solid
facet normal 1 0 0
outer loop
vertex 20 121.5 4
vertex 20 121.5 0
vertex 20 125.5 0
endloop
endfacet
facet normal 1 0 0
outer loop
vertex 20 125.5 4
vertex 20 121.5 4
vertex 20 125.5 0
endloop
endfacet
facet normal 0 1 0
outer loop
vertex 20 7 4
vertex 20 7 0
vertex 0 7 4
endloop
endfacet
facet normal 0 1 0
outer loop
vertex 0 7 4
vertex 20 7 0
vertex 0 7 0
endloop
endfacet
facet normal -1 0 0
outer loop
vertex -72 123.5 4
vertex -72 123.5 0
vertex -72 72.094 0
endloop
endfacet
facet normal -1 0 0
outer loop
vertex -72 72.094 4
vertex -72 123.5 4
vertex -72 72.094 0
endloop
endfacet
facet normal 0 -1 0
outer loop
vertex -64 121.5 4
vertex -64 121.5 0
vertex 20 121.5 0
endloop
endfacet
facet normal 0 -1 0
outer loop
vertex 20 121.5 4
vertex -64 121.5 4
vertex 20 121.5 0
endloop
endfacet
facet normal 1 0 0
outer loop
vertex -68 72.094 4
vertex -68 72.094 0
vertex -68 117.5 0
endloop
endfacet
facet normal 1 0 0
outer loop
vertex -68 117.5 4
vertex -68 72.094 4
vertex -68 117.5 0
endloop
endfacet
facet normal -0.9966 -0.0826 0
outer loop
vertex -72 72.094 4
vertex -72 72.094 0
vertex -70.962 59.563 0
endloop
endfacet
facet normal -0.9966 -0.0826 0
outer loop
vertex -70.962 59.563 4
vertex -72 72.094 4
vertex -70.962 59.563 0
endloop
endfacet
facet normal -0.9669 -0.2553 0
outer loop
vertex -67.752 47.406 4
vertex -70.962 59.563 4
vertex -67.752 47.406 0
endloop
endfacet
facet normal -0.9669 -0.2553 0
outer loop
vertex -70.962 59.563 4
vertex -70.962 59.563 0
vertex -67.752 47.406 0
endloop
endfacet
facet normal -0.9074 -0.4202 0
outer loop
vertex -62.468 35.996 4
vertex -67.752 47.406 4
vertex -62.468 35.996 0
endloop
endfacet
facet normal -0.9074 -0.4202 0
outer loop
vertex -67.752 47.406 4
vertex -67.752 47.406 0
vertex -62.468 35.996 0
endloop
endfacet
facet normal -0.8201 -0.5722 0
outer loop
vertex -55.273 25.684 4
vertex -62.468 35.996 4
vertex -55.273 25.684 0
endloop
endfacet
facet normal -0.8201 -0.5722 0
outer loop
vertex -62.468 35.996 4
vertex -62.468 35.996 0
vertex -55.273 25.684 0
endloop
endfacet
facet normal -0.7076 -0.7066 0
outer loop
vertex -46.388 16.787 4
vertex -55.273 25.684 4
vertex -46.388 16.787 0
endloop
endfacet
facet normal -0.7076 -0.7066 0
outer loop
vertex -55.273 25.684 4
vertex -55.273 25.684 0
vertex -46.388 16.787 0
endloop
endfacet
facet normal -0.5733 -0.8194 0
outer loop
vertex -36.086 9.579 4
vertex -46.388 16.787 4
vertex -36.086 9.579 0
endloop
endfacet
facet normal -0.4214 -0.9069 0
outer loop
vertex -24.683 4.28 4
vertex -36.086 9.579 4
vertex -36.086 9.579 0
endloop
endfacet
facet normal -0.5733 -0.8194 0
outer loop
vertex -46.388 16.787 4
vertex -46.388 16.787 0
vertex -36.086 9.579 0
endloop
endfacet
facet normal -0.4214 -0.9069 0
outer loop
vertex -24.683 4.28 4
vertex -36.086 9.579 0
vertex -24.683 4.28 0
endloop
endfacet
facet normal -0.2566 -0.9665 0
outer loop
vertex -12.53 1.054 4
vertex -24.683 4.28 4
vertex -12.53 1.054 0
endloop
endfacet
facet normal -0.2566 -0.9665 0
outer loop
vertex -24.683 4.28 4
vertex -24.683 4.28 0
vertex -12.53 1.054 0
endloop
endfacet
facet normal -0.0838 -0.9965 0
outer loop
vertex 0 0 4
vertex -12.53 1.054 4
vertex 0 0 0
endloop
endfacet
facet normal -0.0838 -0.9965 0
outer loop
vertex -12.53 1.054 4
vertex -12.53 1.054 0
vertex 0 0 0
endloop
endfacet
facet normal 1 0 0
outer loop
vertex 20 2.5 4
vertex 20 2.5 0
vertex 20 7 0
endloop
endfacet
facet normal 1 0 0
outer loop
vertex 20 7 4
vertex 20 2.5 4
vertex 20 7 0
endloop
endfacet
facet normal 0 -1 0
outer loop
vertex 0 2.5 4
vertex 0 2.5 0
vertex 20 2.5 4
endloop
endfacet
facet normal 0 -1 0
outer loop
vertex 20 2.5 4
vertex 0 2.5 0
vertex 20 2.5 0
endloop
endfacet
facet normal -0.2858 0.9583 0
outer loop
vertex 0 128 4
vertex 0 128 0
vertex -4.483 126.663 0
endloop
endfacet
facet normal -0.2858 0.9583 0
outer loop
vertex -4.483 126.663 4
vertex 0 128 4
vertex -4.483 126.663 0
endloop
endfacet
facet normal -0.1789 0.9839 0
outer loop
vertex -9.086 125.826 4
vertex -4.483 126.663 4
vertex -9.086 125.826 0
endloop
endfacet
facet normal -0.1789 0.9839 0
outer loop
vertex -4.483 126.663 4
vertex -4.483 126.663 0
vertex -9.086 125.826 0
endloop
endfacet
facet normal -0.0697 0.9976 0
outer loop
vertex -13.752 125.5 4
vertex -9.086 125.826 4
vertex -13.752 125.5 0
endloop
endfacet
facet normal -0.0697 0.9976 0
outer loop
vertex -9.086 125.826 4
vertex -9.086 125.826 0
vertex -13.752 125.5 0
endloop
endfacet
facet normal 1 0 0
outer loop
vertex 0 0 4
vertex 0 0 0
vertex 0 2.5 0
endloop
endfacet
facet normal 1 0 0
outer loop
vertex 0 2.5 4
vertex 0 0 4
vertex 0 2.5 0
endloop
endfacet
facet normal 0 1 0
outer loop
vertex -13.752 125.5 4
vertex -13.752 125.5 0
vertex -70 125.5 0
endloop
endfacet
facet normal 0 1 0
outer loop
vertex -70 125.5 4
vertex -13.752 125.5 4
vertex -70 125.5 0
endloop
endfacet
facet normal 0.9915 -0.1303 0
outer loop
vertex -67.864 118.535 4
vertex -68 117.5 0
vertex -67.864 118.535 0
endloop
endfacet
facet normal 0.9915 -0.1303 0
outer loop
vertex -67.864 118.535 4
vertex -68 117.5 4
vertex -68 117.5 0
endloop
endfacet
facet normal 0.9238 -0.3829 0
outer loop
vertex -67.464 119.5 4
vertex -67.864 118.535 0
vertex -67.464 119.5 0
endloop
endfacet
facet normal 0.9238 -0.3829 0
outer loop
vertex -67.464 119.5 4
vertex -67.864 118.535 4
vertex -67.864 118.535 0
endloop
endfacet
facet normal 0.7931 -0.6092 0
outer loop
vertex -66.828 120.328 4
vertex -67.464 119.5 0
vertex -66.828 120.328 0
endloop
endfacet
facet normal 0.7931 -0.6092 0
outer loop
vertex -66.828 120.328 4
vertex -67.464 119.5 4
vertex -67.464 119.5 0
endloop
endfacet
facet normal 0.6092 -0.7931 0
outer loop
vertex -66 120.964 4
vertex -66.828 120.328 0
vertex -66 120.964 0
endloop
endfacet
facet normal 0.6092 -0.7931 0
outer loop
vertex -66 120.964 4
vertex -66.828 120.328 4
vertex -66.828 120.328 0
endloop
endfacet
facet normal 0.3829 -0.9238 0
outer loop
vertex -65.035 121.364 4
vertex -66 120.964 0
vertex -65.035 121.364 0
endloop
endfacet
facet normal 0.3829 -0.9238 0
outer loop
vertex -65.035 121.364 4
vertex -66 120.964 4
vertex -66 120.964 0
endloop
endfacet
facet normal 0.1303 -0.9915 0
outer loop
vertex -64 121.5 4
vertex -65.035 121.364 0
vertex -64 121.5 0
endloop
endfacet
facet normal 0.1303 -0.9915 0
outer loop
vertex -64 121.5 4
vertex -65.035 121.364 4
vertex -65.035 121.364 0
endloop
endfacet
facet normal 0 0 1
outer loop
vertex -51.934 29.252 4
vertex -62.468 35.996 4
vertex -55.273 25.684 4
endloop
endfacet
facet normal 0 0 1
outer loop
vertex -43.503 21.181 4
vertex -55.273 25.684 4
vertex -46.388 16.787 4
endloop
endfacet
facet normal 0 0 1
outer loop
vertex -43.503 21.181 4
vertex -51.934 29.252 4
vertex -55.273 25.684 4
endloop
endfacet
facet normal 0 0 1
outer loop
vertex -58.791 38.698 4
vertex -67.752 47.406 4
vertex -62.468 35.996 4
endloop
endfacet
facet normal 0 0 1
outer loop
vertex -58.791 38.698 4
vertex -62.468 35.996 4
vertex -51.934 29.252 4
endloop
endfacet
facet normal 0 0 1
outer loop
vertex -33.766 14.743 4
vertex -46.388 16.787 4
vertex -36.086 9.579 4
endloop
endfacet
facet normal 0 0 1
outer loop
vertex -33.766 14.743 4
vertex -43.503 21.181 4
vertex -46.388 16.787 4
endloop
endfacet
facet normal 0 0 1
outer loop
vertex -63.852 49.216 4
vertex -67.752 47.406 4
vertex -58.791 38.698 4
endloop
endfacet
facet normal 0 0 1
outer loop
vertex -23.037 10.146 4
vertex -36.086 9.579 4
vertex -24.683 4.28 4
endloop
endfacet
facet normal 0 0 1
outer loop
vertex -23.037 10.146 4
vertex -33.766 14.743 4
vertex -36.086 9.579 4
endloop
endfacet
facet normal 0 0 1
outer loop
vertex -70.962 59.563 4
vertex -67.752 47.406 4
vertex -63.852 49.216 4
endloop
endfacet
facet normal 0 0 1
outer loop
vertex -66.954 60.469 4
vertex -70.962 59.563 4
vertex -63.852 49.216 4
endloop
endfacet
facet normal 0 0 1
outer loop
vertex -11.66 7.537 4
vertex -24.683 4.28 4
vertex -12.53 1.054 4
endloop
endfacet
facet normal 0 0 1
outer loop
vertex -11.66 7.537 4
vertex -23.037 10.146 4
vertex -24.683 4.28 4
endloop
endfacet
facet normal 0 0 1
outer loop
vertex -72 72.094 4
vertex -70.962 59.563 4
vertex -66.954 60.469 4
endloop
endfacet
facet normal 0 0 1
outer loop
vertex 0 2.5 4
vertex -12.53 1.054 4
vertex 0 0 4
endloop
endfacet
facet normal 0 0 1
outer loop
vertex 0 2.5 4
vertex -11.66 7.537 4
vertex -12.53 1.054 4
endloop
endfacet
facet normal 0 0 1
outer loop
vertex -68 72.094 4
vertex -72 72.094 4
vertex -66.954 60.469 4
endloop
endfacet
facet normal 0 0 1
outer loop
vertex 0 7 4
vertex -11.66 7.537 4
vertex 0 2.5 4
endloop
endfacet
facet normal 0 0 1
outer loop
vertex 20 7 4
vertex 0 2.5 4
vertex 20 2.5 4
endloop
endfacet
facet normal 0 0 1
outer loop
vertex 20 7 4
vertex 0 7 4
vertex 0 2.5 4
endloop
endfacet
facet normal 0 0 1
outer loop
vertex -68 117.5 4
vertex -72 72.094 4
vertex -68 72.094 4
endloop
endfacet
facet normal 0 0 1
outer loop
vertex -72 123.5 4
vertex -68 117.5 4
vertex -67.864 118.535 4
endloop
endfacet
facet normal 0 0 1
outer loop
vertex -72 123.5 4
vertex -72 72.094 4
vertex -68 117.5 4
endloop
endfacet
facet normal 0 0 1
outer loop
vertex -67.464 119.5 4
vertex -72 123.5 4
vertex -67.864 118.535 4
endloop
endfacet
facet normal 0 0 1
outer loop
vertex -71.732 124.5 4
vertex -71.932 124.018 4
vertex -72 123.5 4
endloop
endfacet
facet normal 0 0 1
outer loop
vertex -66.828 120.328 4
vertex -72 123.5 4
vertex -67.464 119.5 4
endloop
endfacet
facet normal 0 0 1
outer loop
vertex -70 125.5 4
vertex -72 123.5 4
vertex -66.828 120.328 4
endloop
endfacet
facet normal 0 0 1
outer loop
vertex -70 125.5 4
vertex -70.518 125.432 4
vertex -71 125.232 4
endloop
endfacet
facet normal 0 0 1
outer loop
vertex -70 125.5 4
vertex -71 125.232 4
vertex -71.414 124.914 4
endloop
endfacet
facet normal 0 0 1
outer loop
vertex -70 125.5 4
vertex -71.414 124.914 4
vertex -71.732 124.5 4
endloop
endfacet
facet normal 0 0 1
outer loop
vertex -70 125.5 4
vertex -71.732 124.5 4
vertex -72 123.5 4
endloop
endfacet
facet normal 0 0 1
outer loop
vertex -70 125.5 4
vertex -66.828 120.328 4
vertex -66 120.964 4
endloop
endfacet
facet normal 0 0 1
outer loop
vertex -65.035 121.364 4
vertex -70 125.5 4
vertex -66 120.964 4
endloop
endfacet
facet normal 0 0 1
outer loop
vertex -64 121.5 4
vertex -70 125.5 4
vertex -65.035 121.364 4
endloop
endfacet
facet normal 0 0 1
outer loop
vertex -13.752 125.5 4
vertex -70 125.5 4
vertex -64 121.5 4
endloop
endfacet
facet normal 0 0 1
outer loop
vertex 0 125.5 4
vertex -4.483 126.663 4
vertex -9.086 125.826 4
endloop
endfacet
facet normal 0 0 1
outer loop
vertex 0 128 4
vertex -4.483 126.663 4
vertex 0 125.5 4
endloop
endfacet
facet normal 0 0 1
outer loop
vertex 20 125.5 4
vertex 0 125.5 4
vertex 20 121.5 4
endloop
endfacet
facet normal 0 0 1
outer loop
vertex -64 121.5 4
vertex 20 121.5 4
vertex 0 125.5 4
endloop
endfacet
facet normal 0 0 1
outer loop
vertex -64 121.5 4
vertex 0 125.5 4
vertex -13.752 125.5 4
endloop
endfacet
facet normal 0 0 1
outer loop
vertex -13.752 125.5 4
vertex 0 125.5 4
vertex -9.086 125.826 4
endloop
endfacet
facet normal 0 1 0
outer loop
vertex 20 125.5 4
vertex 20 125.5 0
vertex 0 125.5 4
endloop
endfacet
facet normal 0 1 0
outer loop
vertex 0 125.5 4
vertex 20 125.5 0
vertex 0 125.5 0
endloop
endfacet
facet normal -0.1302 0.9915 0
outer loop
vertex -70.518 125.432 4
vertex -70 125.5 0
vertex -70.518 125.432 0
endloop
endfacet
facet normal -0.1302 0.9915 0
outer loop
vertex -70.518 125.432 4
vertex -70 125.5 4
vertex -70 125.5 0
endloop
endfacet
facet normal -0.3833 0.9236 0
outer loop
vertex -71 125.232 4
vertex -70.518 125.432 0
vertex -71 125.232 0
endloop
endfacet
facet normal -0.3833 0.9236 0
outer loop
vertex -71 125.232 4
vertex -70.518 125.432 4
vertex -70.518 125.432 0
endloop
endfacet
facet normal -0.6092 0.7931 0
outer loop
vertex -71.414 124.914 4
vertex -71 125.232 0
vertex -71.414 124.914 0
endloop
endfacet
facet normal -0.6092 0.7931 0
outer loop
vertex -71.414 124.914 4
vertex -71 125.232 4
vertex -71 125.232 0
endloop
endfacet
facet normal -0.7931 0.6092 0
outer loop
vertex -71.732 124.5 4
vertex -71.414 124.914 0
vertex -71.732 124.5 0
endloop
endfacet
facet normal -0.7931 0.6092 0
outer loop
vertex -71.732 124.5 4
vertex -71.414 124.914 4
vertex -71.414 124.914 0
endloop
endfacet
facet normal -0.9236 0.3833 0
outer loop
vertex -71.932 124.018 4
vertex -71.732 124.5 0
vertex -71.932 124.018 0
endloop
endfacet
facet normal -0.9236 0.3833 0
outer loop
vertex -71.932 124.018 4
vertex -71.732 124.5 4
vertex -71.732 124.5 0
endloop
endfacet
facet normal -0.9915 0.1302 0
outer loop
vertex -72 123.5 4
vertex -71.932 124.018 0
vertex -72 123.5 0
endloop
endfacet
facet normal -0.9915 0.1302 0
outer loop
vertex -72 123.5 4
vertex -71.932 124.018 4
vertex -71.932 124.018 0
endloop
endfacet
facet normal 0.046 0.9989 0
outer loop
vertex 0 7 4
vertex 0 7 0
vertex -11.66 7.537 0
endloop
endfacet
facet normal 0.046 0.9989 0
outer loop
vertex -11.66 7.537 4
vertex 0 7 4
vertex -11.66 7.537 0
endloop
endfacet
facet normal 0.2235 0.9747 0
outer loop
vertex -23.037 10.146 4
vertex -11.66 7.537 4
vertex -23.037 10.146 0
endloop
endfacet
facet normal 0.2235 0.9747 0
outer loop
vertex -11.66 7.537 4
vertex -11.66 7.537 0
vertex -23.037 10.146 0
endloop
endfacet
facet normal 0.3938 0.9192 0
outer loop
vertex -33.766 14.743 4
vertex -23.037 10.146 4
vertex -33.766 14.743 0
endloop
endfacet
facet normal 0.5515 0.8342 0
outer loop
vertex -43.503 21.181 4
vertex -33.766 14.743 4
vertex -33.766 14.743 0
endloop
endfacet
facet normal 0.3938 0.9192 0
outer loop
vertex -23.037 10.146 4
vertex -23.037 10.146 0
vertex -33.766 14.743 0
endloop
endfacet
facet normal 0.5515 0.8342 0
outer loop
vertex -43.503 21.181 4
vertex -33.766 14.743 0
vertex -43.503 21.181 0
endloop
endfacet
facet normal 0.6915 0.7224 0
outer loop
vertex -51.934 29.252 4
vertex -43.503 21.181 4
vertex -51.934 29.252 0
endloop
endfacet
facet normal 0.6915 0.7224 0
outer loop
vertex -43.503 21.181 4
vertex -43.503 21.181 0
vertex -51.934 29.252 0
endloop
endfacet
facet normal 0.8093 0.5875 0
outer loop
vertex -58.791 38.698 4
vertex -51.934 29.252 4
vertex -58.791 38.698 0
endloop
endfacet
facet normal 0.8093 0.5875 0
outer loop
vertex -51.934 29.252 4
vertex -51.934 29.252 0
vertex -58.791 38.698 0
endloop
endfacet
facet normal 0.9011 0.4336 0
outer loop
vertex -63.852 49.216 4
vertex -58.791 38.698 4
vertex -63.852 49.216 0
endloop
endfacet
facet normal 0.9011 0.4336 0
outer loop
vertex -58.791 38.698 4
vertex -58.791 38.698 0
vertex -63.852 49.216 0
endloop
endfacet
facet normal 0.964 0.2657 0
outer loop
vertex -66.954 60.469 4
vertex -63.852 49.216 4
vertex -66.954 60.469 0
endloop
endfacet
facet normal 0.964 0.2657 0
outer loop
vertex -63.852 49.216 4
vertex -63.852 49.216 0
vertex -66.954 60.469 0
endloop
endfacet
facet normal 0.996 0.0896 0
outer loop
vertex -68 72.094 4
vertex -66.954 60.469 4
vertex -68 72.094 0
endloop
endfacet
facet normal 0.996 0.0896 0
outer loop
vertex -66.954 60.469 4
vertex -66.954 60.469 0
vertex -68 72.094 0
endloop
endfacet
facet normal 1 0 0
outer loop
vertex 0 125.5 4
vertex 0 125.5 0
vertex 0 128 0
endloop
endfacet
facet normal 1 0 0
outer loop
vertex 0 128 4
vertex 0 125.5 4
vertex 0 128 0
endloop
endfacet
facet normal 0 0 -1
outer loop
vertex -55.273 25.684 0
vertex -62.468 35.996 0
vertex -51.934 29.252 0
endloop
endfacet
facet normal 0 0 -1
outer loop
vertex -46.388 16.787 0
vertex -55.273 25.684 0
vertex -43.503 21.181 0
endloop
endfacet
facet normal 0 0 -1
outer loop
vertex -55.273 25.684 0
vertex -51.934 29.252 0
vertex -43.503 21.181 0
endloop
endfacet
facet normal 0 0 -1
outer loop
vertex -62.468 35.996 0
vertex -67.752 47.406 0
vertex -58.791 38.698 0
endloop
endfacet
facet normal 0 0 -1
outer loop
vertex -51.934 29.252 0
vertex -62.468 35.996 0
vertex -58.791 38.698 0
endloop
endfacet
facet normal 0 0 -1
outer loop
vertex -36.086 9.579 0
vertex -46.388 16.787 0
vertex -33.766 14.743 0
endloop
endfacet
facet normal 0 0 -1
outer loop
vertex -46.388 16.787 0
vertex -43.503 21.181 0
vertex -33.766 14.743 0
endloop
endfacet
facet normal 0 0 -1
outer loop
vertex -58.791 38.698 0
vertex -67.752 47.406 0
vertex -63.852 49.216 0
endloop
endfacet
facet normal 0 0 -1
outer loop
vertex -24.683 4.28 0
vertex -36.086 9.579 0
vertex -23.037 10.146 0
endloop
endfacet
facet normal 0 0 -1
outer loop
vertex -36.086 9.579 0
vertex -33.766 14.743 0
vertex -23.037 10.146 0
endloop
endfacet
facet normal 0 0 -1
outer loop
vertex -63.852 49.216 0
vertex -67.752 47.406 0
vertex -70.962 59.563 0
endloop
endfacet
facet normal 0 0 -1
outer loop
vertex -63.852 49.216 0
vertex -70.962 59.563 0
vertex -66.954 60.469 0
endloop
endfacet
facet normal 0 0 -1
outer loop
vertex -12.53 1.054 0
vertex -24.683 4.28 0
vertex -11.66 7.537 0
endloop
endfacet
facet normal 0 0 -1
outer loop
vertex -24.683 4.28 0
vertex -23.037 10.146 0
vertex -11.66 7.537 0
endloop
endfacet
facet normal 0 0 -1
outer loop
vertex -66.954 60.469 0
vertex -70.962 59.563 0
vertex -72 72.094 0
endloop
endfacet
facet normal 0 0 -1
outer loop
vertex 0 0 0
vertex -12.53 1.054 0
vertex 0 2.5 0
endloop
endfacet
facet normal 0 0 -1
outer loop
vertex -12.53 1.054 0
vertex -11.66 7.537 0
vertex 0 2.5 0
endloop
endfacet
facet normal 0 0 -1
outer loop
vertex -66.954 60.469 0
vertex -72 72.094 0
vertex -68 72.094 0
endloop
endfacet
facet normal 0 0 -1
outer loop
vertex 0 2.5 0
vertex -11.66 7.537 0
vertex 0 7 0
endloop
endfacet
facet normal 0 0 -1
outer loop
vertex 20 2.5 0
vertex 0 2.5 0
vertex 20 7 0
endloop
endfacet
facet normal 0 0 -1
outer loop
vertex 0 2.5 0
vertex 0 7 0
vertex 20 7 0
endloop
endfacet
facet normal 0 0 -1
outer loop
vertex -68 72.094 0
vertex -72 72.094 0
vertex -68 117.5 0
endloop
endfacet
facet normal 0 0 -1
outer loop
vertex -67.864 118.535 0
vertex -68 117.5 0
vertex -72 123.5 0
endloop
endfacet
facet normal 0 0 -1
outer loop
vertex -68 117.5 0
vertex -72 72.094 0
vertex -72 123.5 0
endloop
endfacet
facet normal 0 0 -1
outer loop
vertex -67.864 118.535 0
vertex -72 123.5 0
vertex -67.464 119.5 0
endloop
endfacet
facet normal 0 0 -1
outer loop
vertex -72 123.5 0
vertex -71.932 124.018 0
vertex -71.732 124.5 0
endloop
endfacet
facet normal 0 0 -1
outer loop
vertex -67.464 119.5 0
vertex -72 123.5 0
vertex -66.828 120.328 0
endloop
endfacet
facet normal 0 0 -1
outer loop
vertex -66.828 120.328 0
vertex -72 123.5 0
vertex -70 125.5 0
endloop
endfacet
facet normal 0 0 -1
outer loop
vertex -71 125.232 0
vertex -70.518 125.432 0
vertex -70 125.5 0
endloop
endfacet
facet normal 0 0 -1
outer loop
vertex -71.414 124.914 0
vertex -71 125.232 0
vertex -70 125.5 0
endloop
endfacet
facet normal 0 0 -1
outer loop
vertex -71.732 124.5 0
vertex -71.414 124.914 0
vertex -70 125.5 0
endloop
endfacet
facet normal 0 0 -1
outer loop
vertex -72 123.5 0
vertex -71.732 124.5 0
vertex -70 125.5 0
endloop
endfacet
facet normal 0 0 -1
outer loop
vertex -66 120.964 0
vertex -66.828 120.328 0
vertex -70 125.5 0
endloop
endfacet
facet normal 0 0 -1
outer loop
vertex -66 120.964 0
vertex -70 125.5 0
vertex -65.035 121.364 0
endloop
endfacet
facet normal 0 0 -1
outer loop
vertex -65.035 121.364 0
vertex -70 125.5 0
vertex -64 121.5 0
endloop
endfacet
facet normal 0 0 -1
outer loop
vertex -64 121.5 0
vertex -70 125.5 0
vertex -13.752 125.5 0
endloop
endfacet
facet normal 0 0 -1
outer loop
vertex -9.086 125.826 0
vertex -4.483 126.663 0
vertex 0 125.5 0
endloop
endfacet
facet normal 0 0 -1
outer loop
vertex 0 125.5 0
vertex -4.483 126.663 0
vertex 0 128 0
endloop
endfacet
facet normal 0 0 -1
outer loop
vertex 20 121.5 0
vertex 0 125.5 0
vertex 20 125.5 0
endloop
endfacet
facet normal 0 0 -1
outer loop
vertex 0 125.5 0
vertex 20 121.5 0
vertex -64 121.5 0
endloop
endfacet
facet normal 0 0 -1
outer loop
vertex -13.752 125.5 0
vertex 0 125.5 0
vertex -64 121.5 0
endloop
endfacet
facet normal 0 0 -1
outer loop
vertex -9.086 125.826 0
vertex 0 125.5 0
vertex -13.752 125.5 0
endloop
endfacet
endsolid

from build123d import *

# Parameters (mm, degrees)
BOSS_EXTRUDE1_DEPTH = 4
FILLET1_R           = 4
FILLET2_R           = 2


with BuildPart() as part:
    # Sketch1 → Boss-Extrude1 (new body)
    with BuildSketch(Plane.XY):
        with BuildLine():
            Line((0, 0), (0, 2.5))
            Line((0, 2.5), (20, 2.5))
            Line((20, 2.5), (20, 7))
            Line((20, 7), (0, 7))
            ThreePointArc((0, 7), (-47.899542657, 25.027060394), (-68, 72.09416895))
            Line((-68, 72.09416895), (-68, 121.5))
            Line((-68, 121.5), (20, 121.5))
            Line((20, 121.5), (20, 125.5))
            Line((20, 125.5), (0, 125.5))
            Line((0, 125.5), (0, 128))
            ThreePointArc((0, 128), (-6.772700236, 126.180912146), (-13.752306798, 125.5))
            Line((-13.752306798, 125.5), (-68, 125.5))
            Line((-68, 125.5), (-72, 125.5))
            Line((-72, 125.5), (-72, 72.09416895))
            ThreePointArc((-72, 72.09416895), (-51.025872308, 21.040838867), (0, 0))
        make_face()
    extrude(amount=BOSS_EXTRUDE1_DEPTH)

    # Fillet1
    fillet1_edges = [part.edges().sort_by_distance(p)[0] for p in [
        (-68, 121.5, 2),
    ]]
    fillet(fillet1_edges, radius=FILLET1_R)

    # Fillet2
    fillet2_edges = [part.edges().sort_by_distance(p)[0] for p in [
        (-72, 125.5, 2),
    ]]
    fillet(fillet2_edges, radius=FILLET2_R)


solid = part.part
